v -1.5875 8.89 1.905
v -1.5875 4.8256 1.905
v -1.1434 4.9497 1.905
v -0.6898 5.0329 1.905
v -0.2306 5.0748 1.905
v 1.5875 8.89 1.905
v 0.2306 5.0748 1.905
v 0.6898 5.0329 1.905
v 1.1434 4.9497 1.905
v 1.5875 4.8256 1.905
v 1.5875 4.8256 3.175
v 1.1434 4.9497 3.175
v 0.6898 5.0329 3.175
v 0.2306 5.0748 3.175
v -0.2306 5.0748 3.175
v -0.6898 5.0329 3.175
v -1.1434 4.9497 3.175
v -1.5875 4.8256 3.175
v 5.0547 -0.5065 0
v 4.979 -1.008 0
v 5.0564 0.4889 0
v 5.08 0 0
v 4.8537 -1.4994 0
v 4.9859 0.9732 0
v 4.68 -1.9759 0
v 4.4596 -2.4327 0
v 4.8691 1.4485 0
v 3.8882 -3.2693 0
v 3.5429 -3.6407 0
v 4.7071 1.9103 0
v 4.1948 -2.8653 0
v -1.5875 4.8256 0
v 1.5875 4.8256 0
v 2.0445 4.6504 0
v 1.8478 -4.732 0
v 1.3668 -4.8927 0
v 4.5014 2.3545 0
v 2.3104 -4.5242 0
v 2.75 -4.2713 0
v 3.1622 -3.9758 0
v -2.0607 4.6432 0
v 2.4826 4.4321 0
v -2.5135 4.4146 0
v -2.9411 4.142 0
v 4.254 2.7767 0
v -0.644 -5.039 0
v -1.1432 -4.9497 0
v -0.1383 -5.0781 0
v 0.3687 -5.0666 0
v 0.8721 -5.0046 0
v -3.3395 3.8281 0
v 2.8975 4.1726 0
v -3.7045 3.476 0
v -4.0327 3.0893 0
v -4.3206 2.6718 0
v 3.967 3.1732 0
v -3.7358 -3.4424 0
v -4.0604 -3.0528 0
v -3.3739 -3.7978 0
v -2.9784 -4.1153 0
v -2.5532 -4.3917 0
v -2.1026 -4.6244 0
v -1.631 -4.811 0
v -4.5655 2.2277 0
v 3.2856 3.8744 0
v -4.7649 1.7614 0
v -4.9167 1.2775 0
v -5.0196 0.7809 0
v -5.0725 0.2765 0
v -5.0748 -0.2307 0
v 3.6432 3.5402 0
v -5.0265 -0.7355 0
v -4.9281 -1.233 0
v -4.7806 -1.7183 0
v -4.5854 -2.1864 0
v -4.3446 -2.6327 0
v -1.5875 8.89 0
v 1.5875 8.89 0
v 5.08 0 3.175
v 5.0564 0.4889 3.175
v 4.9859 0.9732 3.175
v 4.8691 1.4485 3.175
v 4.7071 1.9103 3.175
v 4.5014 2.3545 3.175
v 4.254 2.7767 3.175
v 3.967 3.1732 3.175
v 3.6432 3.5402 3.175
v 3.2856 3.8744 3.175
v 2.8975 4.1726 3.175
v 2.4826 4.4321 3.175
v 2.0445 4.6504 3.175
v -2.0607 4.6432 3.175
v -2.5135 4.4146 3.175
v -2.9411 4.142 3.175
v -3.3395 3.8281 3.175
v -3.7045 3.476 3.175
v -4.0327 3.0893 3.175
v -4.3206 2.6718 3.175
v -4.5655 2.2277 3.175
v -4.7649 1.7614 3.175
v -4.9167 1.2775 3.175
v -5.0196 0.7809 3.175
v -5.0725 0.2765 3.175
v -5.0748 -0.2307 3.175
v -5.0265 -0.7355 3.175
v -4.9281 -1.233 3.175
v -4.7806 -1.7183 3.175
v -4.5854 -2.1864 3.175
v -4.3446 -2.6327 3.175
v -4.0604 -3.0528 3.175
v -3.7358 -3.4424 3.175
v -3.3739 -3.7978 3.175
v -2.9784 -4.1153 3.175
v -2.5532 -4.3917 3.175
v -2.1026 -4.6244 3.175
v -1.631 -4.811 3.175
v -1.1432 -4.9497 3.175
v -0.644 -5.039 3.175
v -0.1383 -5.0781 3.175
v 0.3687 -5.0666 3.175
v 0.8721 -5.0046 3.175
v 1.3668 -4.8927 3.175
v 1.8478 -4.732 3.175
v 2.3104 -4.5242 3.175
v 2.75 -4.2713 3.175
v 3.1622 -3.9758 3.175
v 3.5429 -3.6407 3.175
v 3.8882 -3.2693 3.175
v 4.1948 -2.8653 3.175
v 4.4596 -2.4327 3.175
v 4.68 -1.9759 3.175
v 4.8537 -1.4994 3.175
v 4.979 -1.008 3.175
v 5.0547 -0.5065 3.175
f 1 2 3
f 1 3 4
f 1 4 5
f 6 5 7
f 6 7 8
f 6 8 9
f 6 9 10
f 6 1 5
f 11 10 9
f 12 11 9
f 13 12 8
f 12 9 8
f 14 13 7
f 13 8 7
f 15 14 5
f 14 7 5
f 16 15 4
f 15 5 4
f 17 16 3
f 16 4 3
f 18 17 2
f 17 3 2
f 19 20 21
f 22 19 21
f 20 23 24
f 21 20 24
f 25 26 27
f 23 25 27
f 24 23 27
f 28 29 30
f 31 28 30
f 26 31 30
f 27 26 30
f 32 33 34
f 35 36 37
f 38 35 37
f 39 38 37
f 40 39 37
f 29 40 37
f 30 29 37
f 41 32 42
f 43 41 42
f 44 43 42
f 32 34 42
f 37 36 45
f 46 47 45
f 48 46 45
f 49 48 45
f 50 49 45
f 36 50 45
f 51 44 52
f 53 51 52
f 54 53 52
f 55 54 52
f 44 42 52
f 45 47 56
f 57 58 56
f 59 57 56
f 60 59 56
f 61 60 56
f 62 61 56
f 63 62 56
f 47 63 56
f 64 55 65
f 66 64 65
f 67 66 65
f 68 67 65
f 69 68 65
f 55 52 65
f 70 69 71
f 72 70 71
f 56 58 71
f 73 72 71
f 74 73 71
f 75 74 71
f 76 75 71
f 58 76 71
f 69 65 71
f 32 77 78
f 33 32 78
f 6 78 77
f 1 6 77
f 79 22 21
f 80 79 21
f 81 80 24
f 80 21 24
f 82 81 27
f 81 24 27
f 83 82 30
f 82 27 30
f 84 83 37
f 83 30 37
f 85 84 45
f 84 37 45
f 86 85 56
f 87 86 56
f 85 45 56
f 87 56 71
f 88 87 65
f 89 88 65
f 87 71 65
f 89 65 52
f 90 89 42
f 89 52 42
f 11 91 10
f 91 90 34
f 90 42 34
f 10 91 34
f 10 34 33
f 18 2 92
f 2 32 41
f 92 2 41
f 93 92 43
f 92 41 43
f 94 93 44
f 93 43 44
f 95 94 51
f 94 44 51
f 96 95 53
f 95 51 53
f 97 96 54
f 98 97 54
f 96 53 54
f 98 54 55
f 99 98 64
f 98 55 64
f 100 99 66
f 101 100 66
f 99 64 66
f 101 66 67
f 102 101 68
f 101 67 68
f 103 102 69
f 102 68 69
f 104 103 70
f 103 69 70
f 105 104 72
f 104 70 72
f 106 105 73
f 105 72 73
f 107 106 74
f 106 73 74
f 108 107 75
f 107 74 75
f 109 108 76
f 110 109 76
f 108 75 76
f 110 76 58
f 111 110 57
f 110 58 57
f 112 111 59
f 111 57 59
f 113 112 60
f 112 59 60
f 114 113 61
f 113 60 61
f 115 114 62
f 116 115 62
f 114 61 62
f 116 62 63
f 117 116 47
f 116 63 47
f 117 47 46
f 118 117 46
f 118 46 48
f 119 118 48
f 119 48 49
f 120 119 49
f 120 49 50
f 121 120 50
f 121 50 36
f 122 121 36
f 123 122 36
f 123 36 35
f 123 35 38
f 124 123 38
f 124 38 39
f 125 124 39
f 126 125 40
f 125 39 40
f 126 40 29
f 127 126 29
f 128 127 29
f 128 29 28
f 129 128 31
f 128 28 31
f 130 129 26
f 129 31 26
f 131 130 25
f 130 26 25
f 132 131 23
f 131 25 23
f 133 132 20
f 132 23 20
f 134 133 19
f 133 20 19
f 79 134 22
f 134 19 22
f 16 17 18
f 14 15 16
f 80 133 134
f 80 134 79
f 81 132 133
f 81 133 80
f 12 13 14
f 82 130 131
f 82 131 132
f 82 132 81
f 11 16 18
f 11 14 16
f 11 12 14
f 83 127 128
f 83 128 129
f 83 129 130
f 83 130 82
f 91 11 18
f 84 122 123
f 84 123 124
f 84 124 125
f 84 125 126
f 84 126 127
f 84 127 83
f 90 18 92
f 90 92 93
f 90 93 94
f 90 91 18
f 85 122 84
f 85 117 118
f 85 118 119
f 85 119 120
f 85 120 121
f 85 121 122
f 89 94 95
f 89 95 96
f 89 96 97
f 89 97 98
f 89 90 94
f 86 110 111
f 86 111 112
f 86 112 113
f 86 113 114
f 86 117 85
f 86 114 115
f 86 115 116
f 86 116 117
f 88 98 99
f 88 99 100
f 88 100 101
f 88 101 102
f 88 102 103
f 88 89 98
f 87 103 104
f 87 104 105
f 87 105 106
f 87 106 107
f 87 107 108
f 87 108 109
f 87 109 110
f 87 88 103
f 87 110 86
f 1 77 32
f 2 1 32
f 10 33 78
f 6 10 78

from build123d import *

# Parameters (mm, degrees)
F1_DEPTH = 3.175
F2_DEPTH = 1.905


with BuildPart() as f1:
    # F0 (on Top) → F1 (new body)
    with BuildSketch(Plane.XY):
        with BuildLine():
            ThreePointArc((-1.5875, 4.825582), (-2.978414, -4.11527), (5.08, 0))
            ThreePointArc((5.08, 0), (4.11527, 2.978414), (1.5875, 4.825582))
            ThreePointArc((1.5875, 4.825582), (0, 5.08), (-1.5875, 4.825582))
        make_face()
    extrude(amount=F1_DEPTH)

    # F0 (on Top) → F2 (join)
    with BuildSketch(Plane.XY):
        with BuildLine():
            ThreePointArc((-1.5875, 4.825582), (0, 5.08), (1.5875, 4.825582))
            Line((1.5875, 4.825582), (1.5875, 8.89))
            Line((1.5875, 8.89), (-1.5875, 8.89))
            Line((-1.5875, 8.89), (-1.5875, 4.825582))
        make_face()
    extrude(amount=F2_DEPTH)


solid = f1.part
